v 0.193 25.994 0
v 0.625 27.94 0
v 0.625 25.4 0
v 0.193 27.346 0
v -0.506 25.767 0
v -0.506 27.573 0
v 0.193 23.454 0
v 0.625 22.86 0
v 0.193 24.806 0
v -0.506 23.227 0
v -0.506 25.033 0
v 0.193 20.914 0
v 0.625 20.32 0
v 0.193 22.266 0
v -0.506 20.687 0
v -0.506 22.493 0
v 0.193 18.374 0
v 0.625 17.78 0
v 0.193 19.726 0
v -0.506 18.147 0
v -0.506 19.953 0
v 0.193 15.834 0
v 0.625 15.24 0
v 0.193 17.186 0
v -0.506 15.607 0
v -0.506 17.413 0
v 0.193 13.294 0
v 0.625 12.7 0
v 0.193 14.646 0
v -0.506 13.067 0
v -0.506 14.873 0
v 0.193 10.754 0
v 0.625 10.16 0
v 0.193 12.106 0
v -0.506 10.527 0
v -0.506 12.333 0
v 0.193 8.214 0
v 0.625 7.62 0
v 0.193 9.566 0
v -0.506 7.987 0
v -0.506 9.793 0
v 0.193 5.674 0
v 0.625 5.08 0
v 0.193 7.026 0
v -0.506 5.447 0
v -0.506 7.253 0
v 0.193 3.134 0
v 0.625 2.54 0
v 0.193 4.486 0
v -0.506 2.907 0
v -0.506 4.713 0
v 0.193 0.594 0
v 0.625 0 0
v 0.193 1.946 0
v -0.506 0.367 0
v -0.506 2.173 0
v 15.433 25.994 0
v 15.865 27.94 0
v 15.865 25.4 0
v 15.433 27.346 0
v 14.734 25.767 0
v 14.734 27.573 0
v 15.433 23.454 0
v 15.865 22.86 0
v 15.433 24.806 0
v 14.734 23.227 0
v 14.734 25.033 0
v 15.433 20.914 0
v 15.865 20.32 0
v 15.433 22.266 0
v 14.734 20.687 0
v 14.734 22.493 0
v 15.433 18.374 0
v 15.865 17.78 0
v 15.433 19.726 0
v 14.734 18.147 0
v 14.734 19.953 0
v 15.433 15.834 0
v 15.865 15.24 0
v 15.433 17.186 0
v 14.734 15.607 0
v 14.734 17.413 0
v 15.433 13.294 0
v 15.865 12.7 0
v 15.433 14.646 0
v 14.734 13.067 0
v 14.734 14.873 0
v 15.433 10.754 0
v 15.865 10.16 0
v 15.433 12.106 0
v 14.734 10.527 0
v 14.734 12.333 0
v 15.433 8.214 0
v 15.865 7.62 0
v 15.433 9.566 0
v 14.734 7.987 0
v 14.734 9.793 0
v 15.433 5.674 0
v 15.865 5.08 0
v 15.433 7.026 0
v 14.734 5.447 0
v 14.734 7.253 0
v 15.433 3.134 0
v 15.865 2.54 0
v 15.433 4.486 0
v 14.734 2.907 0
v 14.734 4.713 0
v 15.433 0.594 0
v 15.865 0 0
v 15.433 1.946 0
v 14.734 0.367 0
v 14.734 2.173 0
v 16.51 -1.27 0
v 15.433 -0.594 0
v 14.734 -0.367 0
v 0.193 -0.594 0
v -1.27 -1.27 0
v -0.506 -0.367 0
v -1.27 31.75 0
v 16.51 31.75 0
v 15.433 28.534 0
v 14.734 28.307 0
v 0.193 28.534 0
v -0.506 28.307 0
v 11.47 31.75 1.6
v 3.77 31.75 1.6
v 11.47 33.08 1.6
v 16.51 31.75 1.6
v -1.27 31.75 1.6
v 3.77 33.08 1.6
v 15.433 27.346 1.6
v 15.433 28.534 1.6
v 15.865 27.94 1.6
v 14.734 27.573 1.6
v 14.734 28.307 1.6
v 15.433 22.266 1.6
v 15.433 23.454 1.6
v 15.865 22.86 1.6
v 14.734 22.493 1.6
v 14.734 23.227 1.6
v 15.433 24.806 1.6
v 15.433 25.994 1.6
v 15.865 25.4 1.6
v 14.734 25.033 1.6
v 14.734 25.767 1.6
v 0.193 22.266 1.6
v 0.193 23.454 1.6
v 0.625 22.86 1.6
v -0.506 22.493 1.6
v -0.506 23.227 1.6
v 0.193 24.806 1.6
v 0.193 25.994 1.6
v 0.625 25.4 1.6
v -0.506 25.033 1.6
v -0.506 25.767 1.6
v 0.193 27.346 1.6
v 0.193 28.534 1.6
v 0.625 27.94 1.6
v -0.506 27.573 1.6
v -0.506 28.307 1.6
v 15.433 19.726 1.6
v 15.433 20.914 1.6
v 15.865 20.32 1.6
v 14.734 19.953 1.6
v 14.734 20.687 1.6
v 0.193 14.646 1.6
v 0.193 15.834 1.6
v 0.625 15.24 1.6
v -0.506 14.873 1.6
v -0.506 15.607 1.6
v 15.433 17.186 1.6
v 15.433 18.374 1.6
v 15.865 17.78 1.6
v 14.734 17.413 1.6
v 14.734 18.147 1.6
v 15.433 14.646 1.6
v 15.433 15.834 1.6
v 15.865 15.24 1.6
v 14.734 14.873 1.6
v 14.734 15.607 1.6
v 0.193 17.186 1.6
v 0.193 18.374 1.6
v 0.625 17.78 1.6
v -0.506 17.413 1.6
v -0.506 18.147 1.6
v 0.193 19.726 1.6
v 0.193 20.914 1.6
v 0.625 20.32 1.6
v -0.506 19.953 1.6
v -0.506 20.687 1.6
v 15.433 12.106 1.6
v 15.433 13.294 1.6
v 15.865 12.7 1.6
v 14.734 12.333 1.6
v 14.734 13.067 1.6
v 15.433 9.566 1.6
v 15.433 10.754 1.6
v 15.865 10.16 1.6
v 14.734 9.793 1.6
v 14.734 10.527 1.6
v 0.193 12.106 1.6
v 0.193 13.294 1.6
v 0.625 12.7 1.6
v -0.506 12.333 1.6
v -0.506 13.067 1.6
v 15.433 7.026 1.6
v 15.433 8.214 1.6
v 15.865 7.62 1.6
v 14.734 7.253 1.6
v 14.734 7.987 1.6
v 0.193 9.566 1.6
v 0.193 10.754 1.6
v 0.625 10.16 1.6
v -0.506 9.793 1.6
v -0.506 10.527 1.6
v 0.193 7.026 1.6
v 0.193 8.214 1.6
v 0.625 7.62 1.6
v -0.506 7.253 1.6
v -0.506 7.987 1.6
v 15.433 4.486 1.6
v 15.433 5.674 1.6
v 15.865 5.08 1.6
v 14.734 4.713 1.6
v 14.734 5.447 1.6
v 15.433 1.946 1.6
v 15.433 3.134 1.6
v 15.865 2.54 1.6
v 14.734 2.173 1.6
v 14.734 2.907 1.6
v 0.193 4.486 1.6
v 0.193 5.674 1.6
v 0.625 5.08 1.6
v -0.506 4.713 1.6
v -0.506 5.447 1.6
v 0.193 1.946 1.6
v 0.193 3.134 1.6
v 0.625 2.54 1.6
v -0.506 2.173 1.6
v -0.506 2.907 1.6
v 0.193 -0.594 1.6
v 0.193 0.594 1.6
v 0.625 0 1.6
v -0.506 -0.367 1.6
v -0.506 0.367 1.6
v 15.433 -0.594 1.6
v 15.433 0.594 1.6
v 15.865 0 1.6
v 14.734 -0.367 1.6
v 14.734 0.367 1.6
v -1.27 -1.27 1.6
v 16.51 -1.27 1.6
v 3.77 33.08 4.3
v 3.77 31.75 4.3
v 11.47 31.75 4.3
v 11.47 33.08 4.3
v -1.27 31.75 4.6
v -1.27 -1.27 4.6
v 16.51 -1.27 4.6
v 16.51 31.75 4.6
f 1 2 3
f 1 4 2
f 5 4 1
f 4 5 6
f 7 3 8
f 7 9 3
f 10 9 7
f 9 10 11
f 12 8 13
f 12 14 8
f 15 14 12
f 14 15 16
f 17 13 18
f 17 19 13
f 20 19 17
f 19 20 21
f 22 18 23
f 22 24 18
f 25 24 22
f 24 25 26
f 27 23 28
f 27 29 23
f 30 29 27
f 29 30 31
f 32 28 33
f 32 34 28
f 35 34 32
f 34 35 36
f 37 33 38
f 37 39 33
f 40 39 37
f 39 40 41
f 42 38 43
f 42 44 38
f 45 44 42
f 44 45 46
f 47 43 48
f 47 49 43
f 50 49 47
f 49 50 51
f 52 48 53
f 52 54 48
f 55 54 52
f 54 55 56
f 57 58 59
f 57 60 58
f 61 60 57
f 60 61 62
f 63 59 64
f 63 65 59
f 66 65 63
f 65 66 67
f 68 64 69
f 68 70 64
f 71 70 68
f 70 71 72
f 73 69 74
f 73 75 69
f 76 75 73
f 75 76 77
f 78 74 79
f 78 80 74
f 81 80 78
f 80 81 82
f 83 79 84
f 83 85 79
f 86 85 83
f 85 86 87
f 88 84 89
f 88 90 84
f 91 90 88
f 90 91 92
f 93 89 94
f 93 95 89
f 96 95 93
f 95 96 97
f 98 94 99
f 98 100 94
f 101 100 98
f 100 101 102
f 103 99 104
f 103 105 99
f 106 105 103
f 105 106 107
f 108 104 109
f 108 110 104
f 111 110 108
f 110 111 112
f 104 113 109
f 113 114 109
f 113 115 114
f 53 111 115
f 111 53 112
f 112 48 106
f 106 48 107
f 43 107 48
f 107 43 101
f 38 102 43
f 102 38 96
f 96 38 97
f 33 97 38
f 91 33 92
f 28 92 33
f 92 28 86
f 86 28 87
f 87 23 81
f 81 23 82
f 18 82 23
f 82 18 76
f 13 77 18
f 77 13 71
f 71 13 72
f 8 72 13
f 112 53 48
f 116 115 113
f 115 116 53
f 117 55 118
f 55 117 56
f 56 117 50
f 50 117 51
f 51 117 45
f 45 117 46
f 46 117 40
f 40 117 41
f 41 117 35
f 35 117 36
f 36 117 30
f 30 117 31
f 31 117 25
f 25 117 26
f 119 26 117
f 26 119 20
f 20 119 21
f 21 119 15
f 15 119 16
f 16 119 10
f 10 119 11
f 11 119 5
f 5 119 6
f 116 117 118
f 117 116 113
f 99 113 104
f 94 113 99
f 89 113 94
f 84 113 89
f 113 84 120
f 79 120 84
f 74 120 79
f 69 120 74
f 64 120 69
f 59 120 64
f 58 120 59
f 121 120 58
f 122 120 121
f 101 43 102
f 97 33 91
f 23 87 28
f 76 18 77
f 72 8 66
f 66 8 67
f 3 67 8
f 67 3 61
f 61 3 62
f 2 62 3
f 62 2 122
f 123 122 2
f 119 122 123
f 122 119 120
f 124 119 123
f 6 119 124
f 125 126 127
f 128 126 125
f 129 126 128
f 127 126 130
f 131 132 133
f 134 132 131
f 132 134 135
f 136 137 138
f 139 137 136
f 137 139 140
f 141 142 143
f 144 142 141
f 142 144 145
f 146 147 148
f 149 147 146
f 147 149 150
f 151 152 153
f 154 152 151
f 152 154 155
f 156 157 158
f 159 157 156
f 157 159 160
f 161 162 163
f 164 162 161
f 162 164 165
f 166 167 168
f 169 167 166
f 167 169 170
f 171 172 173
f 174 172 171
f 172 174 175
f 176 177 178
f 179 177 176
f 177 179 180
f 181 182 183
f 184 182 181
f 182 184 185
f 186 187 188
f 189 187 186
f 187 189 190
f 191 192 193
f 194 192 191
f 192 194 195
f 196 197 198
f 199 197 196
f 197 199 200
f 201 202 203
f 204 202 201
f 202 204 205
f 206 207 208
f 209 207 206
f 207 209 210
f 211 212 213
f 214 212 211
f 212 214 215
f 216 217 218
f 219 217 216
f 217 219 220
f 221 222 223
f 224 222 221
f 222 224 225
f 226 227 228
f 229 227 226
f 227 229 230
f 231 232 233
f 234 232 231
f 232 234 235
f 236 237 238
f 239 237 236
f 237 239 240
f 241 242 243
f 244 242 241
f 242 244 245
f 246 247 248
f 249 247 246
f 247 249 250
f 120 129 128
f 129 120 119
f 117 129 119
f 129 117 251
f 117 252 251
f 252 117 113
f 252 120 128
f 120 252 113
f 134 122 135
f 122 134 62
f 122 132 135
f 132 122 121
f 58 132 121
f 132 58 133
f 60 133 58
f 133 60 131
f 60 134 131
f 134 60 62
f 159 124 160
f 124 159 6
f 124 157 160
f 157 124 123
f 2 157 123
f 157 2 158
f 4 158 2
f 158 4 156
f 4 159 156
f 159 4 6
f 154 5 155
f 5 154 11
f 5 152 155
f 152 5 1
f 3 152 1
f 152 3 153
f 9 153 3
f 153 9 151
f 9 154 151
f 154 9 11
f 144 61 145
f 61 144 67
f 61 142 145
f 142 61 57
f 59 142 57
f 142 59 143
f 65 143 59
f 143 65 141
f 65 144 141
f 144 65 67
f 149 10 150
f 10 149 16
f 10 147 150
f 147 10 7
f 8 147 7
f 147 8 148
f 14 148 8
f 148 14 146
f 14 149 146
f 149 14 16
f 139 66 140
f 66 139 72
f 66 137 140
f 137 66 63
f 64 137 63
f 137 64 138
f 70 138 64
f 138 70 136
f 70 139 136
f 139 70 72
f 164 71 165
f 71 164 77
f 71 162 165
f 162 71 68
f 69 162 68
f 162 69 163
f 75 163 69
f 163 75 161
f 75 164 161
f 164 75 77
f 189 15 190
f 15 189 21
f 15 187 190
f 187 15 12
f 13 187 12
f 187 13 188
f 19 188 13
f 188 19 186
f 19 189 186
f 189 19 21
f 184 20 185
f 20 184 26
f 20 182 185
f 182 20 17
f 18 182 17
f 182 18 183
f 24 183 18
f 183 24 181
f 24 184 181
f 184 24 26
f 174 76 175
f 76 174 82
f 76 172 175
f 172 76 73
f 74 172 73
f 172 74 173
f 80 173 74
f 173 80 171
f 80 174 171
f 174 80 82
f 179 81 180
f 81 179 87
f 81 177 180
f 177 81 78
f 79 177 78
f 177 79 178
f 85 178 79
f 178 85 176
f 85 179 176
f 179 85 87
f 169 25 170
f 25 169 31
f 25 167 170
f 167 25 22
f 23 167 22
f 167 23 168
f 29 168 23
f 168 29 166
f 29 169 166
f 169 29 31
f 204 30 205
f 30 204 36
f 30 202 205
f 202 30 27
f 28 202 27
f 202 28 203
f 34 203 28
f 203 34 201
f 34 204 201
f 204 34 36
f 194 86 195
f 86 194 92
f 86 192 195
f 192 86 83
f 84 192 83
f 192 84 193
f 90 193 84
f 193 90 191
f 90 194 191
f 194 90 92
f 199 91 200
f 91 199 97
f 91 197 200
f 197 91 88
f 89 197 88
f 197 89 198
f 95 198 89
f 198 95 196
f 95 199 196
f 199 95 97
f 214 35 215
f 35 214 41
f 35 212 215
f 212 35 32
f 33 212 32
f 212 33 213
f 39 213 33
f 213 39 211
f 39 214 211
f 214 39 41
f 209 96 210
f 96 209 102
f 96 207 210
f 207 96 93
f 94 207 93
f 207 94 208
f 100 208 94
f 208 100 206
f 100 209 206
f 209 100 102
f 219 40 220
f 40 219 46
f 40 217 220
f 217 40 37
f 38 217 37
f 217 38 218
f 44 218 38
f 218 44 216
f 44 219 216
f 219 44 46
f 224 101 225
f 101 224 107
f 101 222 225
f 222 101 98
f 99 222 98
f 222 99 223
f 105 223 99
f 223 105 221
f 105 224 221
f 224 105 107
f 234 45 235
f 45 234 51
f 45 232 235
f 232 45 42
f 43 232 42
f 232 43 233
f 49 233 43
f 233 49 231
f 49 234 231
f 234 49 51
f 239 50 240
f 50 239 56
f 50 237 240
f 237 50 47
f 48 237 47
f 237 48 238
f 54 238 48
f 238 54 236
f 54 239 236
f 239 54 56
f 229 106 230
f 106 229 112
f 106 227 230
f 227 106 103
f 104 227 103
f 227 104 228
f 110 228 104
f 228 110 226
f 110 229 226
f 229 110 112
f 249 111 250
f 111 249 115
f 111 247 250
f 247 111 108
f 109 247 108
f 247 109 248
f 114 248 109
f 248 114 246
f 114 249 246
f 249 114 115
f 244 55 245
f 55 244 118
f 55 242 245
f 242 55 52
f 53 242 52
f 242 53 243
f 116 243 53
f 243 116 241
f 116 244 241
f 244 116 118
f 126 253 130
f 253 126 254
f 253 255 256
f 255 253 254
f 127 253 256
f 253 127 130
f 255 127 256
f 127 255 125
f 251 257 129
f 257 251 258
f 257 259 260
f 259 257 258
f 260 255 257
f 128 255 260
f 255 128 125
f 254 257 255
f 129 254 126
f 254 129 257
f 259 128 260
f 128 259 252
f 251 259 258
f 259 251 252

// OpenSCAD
/*
  Vitamin: ArduinoPro
  Model of an Arduino Pro Mini/Micro

  Derived from: https://github.com/sparkfun/Pro_Micro/
           and: https://github.com/sparkfun/Arduino_Pro_Mini_328/

  Authors:
    Jamie Osborne (@jmeosbn)

  Local Frame:
    Point of origin is the centre of the bottom left pin (9)

  Parameters:
    type: can be "mini", or "micro";
          otherwise returns a blank board with header pin holes

  Returns:
    Model of an Arduino Pro Mini/Micro with header holes
*/

// ArduinoPro PCB Variables
ArduinoPro_Hole_Diam  = 1.25;                    // hole diameter
ArduinoPro_Hole_Space = 2.54;                    // spacing of the holes
ArduinoPro_Hole_Inset = ArduinoPro_Hole_Space/2; // Inset from board edge
ArduinoPro_PCB_Height = .063 * 25.4;             // thickness of the PCB
ArduinoPro_PCB_Length =  1.3 * 25.4;             // length of the PCB
ArduinoPro_PCB_Width  =  0.7 * 25.4;             // width of the PCB
ArduinoPro_PCB_Colour = [26/255, 90/255, 160/255];

// Show board clearance area for components
ArduinoPro_PCB_Clearance = 3;
ArduinoPro_PCB_Clearance_Show  = true;

// FIXME: export to external vitamin?
module Micro_USB_Clearance() {
  // Rough dimensions for micro usb header
  height  = 2.7;
  area    = [7.7, 5.2];
  colour  = [220/255, 220/255, 220/255];
  move_x  = ArduinoPro_PCB_Width/2 - ArduinoPro_Hole_Inset;
  move_y  = ArduinoPro_PCB_Length - ArduinoPro_Hole_Space;
  move_z  = ArduinoPro_PCB_Height;

  color(colour)
    translate([move_x, move_y, move_z])
    linear_extrude(height=height)
    square(size = area, center = true);
}

module ArduinoPro_PCB() {
  // Bare PCB, origin at location for bottom left hole
  translate([-ArduinoPro_Hole_Inset, -ArduinoPro_Hole_Inset, 0])
    square(size = [ArduinoPro_PCB_Width, ArduinoPro_PCB_Length]);
}

// TODO: Add throughhole/padding
// TODO: Option to show header pins?
// FIXME: export to external vitamin?
module ArduinoPro_Header_Hole() {
  // Standard PCB hole
  circle(r = ArduinoPro_Hole_Diam/2);
}

module ArduinoPro_Headers() {
  // distance between the two header rows
  rowpitch  = ArduinoPro_PCB_Width - ArduinoPro_Hole_Inset*2;
  // length for holes, leaving room for end header and insets
  rowlength = ArduinoPro_PCB_Length - ArduinoPro_Hole_Space - ArduinoPro_Hole_Inset*2;

  // Add headers to either side (along y)
  for (x = [0, rowpitch], y = [0 : ArduinoPro_Hole_Space : rowlength]) {
    translate([x, y, 0]) ArduinoPro_Header_Hole();
  }

}

module ArduinoPro_Serial_Header() {
  // y position for header
  header_y = ArduinoPro_PCB_Length - ArduinoPro_Hole_Inset*2;
  // width for holes, leaving room for insets
  rowwidth = ArduinoPro_PCB_Width - ArduinoPro_Hole_Inset*2;

  // Add serial header along top of board (along x)
  for (x = [ArduinoPro_Hole_Inset : ArduinoPro_Hole_Space : rowwidth]) {
    translate([x, header_y, 0]) ArduinoPro_Header_Hole();
  }
}

module ArduinoPro(type = "mini") {
  union() {
    color(ArduinoPro_PCB_Colour)
    linear_extrude(height=ArduinoPro_PCB_Height)
    difference() {
      // Common Features for Pro Mini/Micro
      ArduinoPro_PCB();
      ArduinoPro_Headers();

      // Features for Pro Mini
      if (type == "mini") {
        // Pro Mini Serial Header
        ArduinoPro_Serial_Header();
      }
    }

    // Features for Pro Micro
    if (type == "micro") {
      // Pro Micro USB port
      Micro_USB_Clearance();
    }

    // Indicate area for minimum board clearance
    if (ArduinoPro_PCB_Clearance_Show)
      color(ArduinoPro_PCB_Colour, 0.1)
      translate([-ArduinoPro_Hole_Inset, -ArduinoPro_Hole_Inset, ArduinoPro_PCB_Height])
      linear_extrude(height=ArduinoPro_PCB_Clearance)
      square(size = [ArduinoPro_PCB_Width, ArduinoPro_PCB_Length]);
  }
}



// Example Usage
*ArduinoPro("mini");
ArduinoPro("micro");
